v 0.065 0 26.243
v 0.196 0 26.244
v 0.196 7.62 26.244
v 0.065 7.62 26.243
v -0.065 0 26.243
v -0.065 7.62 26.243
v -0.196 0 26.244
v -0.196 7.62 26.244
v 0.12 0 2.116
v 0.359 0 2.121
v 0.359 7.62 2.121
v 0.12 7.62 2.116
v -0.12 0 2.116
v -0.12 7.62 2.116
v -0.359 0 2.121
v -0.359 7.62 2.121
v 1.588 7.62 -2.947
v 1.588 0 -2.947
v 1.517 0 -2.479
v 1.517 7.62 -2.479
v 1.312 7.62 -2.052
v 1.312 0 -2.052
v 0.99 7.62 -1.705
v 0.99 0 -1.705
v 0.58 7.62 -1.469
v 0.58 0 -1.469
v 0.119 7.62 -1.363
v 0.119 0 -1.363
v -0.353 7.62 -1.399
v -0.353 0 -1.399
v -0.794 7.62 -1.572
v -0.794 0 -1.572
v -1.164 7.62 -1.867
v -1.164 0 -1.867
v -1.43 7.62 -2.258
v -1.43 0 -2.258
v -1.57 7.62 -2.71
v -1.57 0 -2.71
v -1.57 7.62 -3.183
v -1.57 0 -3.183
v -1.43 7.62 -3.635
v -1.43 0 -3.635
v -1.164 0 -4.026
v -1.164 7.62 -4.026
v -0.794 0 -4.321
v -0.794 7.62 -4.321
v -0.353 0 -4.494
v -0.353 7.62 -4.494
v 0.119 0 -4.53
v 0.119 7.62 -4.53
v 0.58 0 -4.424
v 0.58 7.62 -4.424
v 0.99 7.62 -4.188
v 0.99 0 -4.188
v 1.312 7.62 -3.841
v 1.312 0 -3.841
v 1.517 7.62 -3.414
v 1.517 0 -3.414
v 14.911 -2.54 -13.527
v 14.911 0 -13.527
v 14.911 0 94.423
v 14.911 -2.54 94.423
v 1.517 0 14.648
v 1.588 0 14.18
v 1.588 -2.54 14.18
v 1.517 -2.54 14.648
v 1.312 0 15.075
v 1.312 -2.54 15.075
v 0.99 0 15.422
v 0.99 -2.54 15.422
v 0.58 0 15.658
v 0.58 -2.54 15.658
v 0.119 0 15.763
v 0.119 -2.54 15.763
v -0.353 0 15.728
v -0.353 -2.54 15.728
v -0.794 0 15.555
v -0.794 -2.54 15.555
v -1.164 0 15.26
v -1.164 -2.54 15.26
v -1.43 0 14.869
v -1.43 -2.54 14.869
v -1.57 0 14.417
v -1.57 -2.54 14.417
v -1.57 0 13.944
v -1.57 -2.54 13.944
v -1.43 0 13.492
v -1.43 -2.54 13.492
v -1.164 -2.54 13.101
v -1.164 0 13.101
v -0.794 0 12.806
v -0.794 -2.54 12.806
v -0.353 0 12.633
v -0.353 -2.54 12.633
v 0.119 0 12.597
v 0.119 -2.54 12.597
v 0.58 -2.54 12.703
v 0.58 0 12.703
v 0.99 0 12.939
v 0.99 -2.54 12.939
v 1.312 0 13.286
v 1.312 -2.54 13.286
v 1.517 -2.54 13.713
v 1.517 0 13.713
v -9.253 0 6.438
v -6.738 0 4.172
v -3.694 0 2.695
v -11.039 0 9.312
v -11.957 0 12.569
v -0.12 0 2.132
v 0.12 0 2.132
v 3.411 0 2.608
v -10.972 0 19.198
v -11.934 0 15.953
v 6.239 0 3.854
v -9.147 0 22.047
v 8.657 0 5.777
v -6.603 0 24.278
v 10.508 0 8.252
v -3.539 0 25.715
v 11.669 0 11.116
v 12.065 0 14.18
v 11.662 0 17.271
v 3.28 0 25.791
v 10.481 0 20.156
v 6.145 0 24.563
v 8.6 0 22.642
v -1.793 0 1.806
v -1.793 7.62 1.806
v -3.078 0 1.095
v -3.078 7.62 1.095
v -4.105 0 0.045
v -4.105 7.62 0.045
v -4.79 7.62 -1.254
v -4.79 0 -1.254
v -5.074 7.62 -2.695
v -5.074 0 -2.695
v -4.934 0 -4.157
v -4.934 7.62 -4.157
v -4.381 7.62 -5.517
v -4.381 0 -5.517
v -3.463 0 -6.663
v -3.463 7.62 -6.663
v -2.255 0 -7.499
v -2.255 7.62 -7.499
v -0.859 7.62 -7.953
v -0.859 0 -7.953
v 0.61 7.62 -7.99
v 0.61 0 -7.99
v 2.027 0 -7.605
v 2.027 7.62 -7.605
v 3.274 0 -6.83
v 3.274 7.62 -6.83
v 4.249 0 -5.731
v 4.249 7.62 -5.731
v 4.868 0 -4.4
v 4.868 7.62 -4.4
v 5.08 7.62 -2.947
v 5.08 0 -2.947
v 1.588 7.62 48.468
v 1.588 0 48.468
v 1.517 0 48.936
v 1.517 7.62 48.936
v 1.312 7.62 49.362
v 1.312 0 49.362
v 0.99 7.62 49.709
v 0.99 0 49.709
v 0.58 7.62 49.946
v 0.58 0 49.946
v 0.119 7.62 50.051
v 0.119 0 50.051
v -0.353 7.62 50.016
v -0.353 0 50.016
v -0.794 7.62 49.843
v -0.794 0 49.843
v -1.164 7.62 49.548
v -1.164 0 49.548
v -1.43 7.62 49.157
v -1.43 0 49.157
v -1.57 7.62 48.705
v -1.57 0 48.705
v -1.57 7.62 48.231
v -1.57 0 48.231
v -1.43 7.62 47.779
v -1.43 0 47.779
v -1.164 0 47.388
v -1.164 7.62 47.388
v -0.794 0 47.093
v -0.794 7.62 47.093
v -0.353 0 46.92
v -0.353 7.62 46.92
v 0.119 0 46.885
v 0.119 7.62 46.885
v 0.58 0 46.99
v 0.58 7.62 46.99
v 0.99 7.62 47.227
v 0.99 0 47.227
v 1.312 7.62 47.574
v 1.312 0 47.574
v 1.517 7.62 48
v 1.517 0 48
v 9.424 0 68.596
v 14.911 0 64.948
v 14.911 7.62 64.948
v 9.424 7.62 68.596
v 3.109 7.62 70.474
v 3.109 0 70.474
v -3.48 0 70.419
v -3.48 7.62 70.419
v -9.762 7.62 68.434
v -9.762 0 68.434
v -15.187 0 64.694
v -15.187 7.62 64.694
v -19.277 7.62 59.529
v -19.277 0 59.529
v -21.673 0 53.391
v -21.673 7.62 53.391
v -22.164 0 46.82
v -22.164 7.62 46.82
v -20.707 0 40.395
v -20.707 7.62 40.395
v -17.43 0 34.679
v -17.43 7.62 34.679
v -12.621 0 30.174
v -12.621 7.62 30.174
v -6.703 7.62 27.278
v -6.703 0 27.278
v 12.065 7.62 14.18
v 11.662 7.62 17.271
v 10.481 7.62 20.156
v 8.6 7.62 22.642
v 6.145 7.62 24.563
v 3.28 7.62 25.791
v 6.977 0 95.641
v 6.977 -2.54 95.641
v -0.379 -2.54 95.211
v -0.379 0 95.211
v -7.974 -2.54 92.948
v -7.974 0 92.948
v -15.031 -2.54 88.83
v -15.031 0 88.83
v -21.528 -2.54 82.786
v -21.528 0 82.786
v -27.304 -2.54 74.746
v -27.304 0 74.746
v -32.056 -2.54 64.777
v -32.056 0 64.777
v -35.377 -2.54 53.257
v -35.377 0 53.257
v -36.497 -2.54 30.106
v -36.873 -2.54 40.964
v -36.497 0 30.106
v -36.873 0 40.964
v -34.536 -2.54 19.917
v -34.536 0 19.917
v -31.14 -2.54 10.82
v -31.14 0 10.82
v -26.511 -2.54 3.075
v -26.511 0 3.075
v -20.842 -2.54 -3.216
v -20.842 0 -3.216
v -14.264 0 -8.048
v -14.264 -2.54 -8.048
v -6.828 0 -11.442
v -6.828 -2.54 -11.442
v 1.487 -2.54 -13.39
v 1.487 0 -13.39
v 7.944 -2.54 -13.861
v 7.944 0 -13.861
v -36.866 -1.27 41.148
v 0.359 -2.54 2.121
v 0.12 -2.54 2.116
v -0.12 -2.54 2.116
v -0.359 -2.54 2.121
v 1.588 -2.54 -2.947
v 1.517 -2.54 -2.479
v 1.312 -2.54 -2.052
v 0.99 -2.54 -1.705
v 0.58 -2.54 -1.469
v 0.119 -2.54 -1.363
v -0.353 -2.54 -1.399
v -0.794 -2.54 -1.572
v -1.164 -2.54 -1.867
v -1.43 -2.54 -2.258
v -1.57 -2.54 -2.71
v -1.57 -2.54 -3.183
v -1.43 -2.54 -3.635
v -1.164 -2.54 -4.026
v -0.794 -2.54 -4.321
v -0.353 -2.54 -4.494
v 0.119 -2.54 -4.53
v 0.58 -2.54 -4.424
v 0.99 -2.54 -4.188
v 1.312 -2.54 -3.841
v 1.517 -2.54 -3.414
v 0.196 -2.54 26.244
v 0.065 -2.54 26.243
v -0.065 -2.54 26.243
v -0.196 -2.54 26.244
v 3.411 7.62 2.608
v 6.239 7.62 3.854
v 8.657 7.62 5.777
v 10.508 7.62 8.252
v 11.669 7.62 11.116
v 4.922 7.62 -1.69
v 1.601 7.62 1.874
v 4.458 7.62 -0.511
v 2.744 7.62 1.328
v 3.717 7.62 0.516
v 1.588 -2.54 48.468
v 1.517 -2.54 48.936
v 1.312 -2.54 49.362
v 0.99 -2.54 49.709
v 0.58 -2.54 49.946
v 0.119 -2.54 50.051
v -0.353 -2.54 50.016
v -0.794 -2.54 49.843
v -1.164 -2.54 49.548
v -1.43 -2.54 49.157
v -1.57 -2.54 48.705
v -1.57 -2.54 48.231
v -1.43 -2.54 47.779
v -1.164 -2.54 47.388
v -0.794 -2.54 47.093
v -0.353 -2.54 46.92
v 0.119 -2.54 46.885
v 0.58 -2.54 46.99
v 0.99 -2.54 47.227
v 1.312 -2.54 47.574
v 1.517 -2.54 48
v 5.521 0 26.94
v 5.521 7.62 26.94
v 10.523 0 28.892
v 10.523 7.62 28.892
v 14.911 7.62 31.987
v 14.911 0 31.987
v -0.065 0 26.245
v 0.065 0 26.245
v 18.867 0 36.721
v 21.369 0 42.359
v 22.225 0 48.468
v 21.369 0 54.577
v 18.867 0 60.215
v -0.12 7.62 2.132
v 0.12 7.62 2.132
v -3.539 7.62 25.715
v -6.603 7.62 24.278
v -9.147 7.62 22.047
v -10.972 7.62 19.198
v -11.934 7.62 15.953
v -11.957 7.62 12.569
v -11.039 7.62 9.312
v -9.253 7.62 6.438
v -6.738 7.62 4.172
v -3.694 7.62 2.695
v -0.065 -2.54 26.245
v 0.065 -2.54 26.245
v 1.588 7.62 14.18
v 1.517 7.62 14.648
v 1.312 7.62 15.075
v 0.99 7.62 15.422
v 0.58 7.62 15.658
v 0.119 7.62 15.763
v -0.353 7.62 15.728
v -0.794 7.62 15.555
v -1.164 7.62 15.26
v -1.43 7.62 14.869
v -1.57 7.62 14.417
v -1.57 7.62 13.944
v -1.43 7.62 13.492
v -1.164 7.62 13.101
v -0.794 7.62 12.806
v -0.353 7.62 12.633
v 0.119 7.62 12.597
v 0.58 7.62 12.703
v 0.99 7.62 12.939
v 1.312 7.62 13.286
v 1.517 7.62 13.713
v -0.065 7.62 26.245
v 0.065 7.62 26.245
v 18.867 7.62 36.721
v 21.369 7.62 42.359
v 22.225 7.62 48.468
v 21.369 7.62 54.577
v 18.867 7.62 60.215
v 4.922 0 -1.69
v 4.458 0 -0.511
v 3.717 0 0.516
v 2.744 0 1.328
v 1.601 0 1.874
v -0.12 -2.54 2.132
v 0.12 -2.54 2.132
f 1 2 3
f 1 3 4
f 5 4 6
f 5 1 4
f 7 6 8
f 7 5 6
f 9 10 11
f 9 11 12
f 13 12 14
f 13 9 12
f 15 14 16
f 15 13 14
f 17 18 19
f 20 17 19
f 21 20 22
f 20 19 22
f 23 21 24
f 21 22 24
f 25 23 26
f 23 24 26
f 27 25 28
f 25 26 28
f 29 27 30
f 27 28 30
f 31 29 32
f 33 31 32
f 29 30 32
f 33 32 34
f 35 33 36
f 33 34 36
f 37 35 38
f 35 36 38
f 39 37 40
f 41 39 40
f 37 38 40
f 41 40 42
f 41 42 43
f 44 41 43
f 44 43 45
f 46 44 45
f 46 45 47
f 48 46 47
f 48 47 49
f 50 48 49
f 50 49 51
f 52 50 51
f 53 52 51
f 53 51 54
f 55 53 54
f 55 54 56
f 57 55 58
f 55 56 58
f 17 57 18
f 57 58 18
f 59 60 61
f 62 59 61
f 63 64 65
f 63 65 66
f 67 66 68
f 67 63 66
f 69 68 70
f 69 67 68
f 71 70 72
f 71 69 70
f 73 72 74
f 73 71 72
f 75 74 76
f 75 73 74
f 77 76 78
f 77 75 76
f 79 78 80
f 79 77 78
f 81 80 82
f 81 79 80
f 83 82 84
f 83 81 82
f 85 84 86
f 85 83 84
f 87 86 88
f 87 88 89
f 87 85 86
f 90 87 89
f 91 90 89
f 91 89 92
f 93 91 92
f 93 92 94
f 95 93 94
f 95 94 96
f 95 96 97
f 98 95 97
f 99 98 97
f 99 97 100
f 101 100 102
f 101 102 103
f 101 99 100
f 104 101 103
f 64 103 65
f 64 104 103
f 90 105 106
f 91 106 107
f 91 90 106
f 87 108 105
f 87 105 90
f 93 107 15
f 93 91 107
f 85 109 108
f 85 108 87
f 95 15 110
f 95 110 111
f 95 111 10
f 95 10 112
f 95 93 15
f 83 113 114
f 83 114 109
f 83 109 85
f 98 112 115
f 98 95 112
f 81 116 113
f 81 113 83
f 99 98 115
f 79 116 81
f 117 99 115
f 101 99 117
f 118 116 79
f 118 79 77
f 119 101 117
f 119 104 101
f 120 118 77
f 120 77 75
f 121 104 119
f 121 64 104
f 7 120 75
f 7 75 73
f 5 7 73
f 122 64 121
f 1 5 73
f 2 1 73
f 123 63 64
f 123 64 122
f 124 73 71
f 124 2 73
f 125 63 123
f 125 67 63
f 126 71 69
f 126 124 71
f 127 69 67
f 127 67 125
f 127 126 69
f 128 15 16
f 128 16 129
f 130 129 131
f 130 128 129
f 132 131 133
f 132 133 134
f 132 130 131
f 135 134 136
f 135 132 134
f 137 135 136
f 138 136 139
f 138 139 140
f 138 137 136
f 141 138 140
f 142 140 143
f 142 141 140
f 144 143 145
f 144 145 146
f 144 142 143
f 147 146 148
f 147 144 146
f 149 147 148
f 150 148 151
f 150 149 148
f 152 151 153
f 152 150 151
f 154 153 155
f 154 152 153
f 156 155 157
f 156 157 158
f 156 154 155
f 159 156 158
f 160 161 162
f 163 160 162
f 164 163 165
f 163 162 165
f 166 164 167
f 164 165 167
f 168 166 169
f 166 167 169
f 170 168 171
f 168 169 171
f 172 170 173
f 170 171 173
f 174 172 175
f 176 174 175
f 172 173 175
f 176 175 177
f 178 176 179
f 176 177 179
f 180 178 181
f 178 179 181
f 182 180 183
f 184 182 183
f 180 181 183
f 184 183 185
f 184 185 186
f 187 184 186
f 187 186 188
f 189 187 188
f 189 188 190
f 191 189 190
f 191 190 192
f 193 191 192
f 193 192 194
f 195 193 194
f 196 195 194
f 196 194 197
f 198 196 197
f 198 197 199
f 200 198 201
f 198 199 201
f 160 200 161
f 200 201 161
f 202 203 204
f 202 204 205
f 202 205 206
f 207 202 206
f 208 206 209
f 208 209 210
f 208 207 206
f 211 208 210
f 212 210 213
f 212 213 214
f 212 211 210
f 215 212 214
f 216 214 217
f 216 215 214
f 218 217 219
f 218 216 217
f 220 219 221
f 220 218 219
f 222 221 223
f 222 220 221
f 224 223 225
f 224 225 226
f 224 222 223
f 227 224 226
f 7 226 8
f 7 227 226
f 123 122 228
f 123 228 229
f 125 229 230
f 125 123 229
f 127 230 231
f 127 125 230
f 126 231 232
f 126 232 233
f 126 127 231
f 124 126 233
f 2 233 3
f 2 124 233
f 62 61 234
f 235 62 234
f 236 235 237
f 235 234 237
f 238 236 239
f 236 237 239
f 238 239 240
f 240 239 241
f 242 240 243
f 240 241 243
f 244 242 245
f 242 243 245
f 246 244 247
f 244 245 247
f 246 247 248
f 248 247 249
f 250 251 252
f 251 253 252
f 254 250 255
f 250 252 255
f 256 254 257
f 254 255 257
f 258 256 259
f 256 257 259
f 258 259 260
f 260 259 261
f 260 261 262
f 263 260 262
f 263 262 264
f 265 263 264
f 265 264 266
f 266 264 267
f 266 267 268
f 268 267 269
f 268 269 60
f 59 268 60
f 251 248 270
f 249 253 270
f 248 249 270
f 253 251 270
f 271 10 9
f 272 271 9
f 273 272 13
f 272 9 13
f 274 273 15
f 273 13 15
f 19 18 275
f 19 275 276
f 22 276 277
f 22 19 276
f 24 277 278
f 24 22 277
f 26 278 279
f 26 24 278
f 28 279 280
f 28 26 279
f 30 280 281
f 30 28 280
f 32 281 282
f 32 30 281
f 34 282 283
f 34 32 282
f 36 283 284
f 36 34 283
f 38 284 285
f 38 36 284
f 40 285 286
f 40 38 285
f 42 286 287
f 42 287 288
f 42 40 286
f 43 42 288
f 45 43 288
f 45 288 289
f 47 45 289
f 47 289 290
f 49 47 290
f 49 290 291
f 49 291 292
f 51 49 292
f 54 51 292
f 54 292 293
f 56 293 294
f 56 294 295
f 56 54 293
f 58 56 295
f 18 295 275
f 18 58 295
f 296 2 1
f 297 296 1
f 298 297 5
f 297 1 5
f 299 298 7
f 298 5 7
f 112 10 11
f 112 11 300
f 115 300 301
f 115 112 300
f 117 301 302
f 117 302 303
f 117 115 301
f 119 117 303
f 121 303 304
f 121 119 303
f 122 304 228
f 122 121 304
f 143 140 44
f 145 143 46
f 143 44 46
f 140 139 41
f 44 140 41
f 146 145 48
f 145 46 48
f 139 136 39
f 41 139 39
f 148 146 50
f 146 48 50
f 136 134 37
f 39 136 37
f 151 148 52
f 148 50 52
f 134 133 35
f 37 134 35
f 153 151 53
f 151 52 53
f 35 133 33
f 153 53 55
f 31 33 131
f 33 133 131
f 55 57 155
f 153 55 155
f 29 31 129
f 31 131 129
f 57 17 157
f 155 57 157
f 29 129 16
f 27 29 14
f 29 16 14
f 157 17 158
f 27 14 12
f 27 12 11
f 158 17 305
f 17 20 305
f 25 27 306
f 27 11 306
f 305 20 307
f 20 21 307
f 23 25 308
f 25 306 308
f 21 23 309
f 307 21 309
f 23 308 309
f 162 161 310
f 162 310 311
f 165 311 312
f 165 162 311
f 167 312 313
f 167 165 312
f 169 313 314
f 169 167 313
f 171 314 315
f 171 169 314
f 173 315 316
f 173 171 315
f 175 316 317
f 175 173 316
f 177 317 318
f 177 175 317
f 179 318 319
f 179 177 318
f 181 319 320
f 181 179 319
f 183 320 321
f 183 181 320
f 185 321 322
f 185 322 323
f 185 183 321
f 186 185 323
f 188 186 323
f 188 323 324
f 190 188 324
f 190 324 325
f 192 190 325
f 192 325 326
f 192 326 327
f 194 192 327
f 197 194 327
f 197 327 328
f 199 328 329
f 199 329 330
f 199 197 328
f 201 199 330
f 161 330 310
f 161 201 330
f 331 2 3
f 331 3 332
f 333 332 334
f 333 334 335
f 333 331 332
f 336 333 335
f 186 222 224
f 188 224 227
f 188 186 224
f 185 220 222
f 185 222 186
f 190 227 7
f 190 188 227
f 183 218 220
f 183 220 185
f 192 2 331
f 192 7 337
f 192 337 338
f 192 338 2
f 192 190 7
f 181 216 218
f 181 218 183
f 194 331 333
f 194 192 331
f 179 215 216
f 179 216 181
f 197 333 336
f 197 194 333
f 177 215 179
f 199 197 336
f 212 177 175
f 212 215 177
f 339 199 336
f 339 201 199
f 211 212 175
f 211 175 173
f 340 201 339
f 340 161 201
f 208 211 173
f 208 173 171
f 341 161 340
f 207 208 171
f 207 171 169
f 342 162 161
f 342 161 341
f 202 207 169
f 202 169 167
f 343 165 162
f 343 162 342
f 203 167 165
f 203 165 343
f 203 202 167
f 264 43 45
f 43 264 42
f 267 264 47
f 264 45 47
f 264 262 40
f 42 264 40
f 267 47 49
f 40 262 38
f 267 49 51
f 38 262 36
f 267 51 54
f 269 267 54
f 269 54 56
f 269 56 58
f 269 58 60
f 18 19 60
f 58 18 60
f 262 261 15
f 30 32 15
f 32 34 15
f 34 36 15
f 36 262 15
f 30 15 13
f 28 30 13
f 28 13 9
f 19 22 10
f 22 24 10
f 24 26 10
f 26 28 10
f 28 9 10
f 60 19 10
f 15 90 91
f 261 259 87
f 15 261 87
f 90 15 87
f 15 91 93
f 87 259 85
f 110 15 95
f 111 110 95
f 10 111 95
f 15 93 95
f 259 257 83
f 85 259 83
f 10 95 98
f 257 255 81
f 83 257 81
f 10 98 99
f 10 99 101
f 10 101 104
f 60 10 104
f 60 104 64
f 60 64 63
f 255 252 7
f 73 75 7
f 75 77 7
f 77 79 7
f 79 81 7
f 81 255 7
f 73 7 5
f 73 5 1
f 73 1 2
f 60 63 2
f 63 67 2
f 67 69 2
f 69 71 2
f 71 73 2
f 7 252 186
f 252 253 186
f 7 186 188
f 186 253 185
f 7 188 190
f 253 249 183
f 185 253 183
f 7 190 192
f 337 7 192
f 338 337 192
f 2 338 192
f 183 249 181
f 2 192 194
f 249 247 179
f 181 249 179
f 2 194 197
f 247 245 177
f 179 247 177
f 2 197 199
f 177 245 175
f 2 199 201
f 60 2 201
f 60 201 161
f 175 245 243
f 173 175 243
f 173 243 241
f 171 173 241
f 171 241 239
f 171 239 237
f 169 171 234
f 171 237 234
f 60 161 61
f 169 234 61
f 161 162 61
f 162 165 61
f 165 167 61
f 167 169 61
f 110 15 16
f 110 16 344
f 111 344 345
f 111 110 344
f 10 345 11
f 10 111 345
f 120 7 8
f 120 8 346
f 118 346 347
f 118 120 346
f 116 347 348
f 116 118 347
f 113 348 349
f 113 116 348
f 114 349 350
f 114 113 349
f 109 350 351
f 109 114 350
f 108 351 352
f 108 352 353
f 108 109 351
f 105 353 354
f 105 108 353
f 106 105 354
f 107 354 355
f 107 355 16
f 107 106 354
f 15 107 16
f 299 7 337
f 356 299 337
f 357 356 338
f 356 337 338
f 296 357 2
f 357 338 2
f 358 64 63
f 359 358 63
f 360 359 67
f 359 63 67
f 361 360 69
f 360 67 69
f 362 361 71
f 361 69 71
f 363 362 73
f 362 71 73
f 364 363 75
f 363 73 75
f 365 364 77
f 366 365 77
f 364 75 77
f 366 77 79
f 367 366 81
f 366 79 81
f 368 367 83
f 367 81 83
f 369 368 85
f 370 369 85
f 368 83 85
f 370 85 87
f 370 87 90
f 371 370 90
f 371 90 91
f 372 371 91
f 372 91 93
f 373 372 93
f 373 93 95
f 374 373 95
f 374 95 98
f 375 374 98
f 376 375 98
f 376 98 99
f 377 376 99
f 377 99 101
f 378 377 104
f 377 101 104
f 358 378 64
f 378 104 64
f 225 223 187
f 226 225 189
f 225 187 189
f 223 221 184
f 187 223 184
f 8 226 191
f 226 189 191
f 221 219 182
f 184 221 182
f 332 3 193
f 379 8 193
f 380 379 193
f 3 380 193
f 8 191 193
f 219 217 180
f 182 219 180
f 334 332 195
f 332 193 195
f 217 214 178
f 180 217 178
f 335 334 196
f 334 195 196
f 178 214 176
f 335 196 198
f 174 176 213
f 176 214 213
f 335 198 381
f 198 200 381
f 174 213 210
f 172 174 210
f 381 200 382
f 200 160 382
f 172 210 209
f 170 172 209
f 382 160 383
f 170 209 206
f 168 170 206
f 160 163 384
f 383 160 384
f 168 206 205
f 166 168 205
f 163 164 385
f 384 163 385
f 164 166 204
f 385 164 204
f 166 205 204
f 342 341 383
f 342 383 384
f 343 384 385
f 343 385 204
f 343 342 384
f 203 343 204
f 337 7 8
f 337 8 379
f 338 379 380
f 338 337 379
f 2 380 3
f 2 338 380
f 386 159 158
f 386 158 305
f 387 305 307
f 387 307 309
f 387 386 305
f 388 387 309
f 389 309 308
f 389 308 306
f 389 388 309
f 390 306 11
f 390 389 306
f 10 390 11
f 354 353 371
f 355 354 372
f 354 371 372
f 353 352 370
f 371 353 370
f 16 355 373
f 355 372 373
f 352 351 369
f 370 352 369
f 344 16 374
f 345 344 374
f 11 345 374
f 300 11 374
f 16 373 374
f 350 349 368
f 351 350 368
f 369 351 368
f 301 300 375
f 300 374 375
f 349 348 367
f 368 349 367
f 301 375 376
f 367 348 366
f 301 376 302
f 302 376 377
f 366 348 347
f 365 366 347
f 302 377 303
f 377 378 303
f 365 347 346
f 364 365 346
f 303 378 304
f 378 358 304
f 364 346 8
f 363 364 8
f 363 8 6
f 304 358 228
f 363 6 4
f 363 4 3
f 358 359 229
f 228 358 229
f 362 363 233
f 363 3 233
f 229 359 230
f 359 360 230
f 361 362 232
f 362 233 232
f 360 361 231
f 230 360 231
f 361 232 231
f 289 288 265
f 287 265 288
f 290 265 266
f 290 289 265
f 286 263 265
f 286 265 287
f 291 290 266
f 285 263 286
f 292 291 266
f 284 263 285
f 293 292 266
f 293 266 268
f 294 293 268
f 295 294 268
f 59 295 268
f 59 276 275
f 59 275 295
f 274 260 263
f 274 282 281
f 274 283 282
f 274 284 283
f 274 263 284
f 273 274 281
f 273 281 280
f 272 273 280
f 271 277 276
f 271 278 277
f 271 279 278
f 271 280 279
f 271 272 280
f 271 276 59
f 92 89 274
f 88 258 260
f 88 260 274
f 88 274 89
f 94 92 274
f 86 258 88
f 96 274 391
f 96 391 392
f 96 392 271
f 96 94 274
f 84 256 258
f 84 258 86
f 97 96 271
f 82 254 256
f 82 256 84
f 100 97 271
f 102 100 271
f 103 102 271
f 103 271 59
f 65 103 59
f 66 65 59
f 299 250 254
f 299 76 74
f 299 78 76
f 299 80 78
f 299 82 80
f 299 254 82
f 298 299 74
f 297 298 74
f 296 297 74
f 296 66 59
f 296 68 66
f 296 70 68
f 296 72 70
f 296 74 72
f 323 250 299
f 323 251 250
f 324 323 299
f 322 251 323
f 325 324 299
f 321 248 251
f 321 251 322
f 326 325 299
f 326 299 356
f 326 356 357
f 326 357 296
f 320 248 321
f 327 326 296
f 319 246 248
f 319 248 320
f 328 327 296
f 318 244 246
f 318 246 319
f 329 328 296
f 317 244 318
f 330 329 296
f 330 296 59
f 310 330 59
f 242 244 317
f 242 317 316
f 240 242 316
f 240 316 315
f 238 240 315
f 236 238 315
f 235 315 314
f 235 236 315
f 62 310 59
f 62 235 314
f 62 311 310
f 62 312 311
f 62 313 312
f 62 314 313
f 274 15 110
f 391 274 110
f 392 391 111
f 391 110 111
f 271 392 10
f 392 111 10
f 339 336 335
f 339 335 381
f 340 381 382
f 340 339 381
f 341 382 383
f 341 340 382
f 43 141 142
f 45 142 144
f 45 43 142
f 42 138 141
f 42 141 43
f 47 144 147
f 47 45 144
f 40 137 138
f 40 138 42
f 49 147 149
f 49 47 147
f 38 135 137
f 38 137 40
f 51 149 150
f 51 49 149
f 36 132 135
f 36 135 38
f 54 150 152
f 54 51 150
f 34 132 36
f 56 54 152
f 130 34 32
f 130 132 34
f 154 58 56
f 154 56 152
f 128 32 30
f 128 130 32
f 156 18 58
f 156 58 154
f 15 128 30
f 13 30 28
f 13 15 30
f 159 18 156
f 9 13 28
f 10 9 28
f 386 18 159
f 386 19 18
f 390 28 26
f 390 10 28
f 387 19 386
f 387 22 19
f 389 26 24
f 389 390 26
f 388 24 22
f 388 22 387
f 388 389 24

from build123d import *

# Parameters (mm, degrees)
F0_R     = 1.5875
F1_DEPTH = 2.54
F2_DEPTH = 7.62
F3_DEPTH = 7.62
F4_DEPTH = 7.62


# Not quite as in the source:
# - a feature names something its author has since deleted; it is built from what else it names


with BuildPart() as f1:
    # F0 (on Front) → F1 (new body)
    with BuildSketch(Plane.XZ):
        with BuildLine():
            Line((14.9111676306, 64.9484875902), (14.9111676306, 94.4228925787))
            add(Edge.make_bspline(
                [(14.9111676306, 94.4228925787), (-16.3680333644, 102.4050563574), (-54.9629772168, 39.3364652633), (-21.2016832001, -17.2942446428), (14.9111676306, -13.5271074213)],
                knots=[0, 0, 0, 0, 0.4983109993, 1, 1, 1, 1], degree=3))
            Line((14.9111676306, -13.5271074213), (14.9111676306, 31.9874375527))
            ThreePointArc((14.9111676306, 31.9874375527), (8.0811732468, 27.7642125741), (0.1961948099, 26.2438285592))
            ThreePointArc((0.1961948099, 26.2438285592), (8.6003289292, 22.6420175366), (12.065, 14.1804238741))
            ThreePointArc((12.065, 14.1804238741), (8.6571999537, 5.7770249212), (0.358889107, 2.1207628669))
            ThreePointArc((0.358889107, 2.1207628669), (3.7168236886, 0.516348123), (5.08, -2.9465439729))
            ThreePointArc((5.08, -2.9465439729), (-3.4628920959, -6.6633676615), (-0.358889107, 2.1207628669))
            ThreePointArc((-0.358889107, 2.1207628669), (-12.0647256139, 14.2617925558), (-0.1961948099, 26.2438285592))
            ThreePointArc((-0.1961948099, 26.2438285592), (-20.7037499974, 56.5491358183), (14.9111676306, 64.9484875902))
        make_face()
        with BuildLine():
            Line((14.9111676306, 31.9874375527), (14.9111676306, 64.9484875902))
            ThreePointArc((14.9111676306, 64.9484875902), (-20.7037499974, 56.5491358183), (-0.1961948099, 26.2438285592))
            ThreePointArc((-0.1961948099, 26.2438285592), (0, 26.2454238741), (0.1961948099, 26.2438285592))
            ThreePointArc((0.1961948099, 26.2438285592), (8.0811732468, 27.7642125741), (14.9111676306, 31.9874375527))
        make_face()
        with Locations((0, 48.4679625715)):
            Circle(F0_R, mode=Mode.SUBTRACT)
        with BuildLine():
            ThreePointArc((0.1961948099, 26.2438285592), (0, 26.2429625715), (-0.1961948099, 26.2438285592))
            ThreePointArc((-0.1961948099, 26.2438285592), (-12.0647256139, 14.2617925558), (-0.358889107, 2.1207628669))
            ThreePointArc((-0.358889107, 2.1207628669), (0, 2.1334560271), (0.358889107, 2.1207628669))
            ThreePointArc((0.358889107, 2.1207628669), (8.6571999537, 5.7770249212), (12.065, 14.1804238741))
            ThreePointArc((12.065, 14.1804238741), (8.6003289292, 22.6420175366), (0.1961948099, 26.2438285592))
        make_face()
        with Locations((0, 14.1804238741)):
            Circle(F0_R, mode=Mode.SUBTRACT)
        with BuildLine():
            ThreePointArc((0.358889107, 2.1207628669), (0, 2.1154238741), (-0.358889107, 2.1207628669))
            ThreePointArc((-0.358889107, 2.1207628669), (-3.4628920959, -6.6633676615), (5.08, -2.9465439729))
            ThreePointArc((5.08, -2.9465439729), (3.7168236886, 0.516348123), (0.358889107, 2.1207628669))
        make_face()
        with Locations((0, -2.9465439729)):
            Circle(F0_R, mode=Mode.SUBTRACT)
    extrude(amount=F1_DEPTH)


with BuildPart() as f2:
    # F0 (on Front) → F2 (new body)
    with BuildSketch(Plane.XZ):
        with BuildLine():
            Line((14.9111676306, 31.9874375527), (14.9111676306, 64.9484875902))
            ThreePointArc((14.9111676306, 64.9484875902), (-20.7037499974, 56.5491358183), (-0.1961948099, 26.2438285592))
            ThreePointArc((-0.1961948099, 26.2438285592), (0, 26.2454238741), (0.1961948099, 26.2438285592))
            ThreePointArc((0.1961948099, 26.2438285592), (8.0811732468, 27.7642125741), (14.9111676306, 31.9874375527))
        make_face()
        with Locations((0, 48.4679625715)):
            Circle(F0_R, mode=Mode.SUBTRACT)
        with BuildLine():
            ThreePointArc((22.225, 48.4679625715), (20.3144200703, 57.4832253078), (14.9111676306, 64.9484875902))
            Line((14.9111676306, 64.9484875902), (14.9111676306, 31.9874375527))
            ThreePointArc((14.9111676306, 31.9874375527), (20.3144200703, 39.4526998351), (22.225, 48.4679625715))
        make_face()
    extrude(amount=-F2_DEPTH)


with BuildPart() as f3:
    # F0 (on Front) → F3 (new body)
    with BuildSketch(Plane.XZ):
        with BuildLine():
            ThreePointArc((0.1961948099, 26.2438285592), (0, 26.2429625715), (-0.1961948099, 26.2438285592))
            ThreePointArc((-0.1961948099, 26.2438285592), (-12.0647256139, 14.2617925558), (-0.358889107, 2.1207628669))
            ThreePointArc((-0.358889107, 2.1207628669), (0, 2.1334560271), (0.358889107, 2.1207628669))
            ThreePointArc((0.358889107, 2.1207628669), (8.6571999537, 5.7770249212), (12.065, 14.1804238741))
            ThreePointArc((12.065, 14.1804238741), (8.6003289292, 22.6420175366), (0.1961948099, 26.2438285592))
        make_face()
        with Locations((0, 14.1804238741)):
            Circle(F0_R, mode=Mode.SUBTRACT)
    extrude(amount=-F3_DEPTH)


with BuildPart() as f4:
    # F0 (on Front) → F4 (new body)
    with BuildSketch(Plane.XZ):
        with BuildLine():
            ThreePointArc((0.358889107, 2.1207628669), (0, 2.1154238741), (-0.358889107, 2.1207628669))
            ThreePointArc((-0.358889107, 2.1207628669), (-3.4628920959, -6.6633676615), (5.08, -2.9465439729))
            ThreePointArc((5.08, -2.9465439729), (3.7168236886, 0.516348123), (0.358889107, 2.1207628669))
        make_face()
        with Locations((0, -2.9465439729)):
            Circle(F0_R, mode=Mode.SUBTRACT)
    extrude(amount=-F4_DEPTH)


solid = Compound([f1.part, f2.part, f3.part, f4.part])
